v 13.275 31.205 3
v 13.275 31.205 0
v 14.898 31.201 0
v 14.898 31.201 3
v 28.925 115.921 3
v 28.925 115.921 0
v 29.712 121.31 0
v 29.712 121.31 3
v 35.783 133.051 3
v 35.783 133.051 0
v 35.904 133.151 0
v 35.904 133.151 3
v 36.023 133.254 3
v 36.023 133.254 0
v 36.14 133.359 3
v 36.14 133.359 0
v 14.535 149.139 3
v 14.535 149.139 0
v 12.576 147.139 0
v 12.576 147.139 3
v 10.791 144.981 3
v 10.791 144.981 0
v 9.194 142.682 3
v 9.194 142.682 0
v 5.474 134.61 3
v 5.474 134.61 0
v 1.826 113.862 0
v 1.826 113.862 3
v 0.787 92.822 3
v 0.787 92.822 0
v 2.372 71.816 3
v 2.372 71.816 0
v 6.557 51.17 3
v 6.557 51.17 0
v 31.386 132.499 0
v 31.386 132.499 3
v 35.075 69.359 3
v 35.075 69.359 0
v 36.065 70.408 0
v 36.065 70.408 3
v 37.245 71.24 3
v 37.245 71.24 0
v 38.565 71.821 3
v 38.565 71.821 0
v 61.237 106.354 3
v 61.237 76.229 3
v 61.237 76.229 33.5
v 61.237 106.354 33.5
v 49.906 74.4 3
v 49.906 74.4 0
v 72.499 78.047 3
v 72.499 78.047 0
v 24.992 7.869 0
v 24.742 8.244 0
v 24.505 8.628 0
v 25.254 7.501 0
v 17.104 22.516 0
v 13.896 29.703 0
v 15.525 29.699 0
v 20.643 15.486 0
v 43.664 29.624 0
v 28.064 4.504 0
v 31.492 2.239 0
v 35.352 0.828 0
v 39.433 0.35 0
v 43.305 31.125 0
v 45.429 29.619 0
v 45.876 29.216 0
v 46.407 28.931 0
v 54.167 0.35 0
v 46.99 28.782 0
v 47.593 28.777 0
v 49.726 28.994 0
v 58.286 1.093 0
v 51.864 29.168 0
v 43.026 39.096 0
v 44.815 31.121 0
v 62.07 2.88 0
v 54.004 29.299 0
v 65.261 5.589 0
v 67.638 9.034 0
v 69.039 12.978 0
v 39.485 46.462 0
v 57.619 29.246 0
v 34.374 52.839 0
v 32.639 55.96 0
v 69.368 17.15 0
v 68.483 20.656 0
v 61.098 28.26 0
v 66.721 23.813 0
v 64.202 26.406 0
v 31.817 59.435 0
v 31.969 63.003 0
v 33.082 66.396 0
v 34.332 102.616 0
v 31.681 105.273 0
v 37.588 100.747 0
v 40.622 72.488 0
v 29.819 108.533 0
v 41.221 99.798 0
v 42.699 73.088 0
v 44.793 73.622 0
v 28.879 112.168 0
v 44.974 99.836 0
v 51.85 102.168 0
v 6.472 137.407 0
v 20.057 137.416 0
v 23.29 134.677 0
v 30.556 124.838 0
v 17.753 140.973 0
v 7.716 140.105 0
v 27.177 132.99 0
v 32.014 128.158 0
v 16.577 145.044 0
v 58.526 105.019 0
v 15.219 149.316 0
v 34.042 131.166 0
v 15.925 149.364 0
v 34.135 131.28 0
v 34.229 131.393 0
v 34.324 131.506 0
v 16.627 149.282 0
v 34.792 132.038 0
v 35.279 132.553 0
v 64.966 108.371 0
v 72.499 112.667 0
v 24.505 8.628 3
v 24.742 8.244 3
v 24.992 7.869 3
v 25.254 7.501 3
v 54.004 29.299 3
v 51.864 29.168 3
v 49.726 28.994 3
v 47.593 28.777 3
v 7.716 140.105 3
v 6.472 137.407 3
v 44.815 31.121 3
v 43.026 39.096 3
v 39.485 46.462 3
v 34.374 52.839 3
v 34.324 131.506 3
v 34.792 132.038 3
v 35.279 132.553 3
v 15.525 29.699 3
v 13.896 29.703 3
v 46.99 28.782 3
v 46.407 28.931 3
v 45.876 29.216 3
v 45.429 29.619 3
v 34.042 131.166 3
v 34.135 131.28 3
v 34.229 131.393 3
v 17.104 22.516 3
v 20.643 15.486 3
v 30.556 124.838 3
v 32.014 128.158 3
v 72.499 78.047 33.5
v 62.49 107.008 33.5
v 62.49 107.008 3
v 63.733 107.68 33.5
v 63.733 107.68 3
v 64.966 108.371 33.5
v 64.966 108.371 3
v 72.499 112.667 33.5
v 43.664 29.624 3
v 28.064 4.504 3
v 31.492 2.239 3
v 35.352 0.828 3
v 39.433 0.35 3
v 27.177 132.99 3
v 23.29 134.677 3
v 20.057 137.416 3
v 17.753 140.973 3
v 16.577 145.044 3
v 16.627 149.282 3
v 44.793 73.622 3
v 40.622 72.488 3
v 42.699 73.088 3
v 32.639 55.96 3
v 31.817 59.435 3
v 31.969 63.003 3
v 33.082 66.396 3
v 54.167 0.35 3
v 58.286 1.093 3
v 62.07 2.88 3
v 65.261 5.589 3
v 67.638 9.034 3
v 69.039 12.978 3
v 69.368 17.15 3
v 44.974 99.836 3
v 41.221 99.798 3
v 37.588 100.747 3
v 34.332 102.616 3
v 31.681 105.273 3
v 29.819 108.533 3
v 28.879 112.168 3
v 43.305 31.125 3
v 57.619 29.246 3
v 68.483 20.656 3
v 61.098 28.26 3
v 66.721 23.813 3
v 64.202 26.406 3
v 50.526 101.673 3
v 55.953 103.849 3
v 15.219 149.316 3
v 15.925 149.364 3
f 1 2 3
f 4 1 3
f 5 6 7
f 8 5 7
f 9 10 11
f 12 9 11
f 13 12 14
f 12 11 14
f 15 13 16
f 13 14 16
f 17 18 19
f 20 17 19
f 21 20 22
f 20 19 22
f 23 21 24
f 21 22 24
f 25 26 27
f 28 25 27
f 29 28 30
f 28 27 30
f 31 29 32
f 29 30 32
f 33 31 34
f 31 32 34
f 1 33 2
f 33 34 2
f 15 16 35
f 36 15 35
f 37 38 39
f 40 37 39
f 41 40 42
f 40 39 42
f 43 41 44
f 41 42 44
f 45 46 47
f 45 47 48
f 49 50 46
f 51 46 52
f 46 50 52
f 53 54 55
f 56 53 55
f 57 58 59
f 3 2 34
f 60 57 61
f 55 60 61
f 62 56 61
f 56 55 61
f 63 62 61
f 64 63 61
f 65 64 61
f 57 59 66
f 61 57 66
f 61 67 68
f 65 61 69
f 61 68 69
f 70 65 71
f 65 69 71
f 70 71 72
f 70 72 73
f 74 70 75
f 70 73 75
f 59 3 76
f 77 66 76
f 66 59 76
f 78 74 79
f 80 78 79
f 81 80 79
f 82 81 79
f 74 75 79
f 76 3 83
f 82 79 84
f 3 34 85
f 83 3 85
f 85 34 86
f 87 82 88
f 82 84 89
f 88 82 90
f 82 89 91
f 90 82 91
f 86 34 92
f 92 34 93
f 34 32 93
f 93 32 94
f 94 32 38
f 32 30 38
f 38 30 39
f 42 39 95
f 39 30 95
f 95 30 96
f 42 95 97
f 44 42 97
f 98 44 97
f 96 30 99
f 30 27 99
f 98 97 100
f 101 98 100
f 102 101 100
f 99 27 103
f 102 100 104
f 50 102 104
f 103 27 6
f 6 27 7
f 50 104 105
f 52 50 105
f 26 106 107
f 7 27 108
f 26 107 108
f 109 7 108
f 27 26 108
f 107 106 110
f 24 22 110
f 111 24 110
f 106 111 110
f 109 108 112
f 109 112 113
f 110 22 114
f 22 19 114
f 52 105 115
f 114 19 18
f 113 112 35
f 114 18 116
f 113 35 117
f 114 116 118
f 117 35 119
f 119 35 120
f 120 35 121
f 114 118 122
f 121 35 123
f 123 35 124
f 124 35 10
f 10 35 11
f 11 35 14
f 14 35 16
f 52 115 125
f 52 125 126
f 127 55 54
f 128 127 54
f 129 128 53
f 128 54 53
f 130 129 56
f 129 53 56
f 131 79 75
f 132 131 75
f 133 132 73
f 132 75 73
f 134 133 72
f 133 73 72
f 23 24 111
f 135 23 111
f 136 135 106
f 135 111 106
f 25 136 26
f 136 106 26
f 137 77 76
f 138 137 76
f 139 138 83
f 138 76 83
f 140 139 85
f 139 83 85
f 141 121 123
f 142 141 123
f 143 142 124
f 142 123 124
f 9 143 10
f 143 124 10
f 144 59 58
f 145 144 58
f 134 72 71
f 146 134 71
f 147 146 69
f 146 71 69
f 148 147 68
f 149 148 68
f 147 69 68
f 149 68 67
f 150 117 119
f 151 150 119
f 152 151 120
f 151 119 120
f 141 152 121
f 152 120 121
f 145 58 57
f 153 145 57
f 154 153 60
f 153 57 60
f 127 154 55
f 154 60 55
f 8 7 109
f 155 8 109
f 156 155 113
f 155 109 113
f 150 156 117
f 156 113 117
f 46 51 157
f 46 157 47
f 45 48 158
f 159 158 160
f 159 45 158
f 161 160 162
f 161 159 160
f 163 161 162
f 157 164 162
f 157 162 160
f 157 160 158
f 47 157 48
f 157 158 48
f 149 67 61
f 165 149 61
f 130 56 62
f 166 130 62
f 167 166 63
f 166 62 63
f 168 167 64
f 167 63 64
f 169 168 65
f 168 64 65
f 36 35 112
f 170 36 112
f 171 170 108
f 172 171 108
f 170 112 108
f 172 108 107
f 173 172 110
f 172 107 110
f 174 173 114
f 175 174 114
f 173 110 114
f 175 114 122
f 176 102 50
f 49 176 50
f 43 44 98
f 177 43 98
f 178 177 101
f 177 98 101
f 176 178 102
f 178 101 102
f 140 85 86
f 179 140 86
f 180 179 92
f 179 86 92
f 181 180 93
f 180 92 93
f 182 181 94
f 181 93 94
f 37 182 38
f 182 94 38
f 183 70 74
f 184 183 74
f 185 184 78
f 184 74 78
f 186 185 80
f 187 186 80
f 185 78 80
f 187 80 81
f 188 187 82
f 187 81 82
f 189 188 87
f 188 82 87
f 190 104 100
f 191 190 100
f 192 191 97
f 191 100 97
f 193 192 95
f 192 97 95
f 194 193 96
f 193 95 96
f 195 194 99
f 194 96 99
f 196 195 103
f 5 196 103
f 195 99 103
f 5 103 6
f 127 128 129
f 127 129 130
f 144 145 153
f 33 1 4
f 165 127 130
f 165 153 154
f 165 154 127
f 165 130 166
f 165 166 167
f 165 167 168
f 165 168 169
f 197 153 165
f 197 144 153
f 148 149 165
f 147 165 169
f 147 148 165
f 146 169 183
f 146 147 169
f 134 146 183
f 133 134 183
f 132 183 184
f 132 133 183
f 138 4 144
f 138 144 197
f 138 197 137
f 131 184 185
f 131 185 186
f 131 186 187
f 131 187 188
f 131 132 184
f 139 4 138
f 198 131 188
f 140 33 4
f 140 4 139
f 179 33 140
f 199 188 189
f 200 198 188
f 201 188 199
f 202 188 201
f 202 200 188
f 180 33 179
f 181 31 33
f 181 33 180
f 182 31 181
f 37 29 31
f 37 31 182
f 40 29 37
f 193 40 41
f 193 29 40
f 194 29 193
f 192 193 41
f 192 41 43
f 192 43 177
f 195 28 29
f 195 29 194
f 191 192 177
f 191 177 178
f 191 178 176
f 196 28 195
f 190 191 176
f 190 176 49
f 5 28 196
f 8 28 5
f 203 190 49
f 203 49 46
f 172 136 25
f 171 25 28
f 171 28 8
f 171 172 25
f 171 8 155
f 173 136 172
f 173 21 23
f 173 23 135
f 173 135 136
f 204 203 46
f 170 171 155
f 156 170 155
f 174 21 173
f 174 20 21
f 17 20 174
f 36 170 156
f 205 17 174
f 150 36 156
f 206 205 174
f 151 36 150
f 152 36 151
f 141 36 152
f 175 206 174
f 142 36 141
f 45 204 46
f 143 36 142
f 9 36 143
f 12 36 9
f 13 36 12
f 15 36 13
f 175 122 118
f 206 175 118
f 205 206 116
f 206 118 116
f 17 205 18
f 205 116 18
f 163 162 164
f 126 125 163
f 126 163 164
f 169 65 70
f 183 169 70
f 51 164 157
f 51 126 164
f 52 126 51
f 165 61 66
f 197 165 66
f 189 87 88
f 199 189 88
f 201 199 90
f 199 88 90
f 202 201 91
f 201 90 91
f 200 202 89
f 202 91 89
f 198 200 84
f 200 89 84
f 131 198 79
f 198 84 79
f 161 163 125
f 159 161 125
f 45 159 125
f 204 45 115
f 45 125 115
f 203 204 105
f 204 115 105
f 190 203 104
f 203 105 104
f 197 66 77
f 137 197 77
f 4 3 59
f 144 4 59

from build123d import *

# Parameters (mm, degrees)
BOSS_EXTRUDE2_DEPTH = 3
BOSS_EXTRUDE3_DEPTH = 30.5


with BuildPart() as part:
    # Sketch1 → Boss-Extrude2 (new body)
    with BuildSketch(Plane.XY):
        with BuildLine():
            Line((13.275380686, 31.205054945), (14.898132017, 31.200709019))
            Line((14.898132017, 31.200709019), (15.525048851, 29.699024681))
            Line((15.525048851, 29.699024681), (13.895725818, 29.703388206))
            ThreePointArc((13.895725818, 29.703388206), (18.832488619, 18.980593631), (24.505317159, 8.628349101))
            ThreePointArc((24.505317159, 8.628349101), (24.86546573, 8.055516696), (25.253864185, 7.501449375))
            ThreePointArc((25.253864185, 7.501449375), (31.492395544, 2.238754737), (39.432559358, 0.349567888))
            Line((39.432559358, 0.349567888), (54.166964146, 0.349567888))
            ThreePointArc((54.166964146, 0.349567888), (65.260793251, 5.589158017), (69.367502095, 17.15035568))
            ThreePointArc((69.367502095, 17.15035568), (64.201860596, 26.406348327), (54.004278297, 29.298850229))
            ThreePointArc((54.004278297, 29.298850229), (50.794421974, 29.086613139), (47.592527294, 28.776624992))
            ThreePointArc((47.592527294, 28.776624992), (46.406851761, 28.931308018), (45.428630625, 29.618939254))
            Line((45.428630625, 29.618939254), (43.664188783, 29.623664644))
            Line((43.664188783, 29.623664644), (43.305228514, 31.124631363))
            Line((43.305228514, 31.124631363), (44.814654419, 31.120588936))
            ThreePointArc((44.814654419, 31.120588936), (41.465663123, 42.879415537), (34.373869876, 52.838944354))
            ThreePointArc((34.373869876, 52.838944354), (31.77008993, 61.224226607), (35.075221649, 69.358643168))
            ThreePointArc((35.075221649, 69.358643168), (36.634181143, 70.853545892), (38.565369315, 71.820810645))
            ThreePointArc((38.565369315, 71.820810645), (41.657810048, 72.796166819), (44.793456308, 73.622140114))
            Line((44.793456308, 73.622140114), (49.906358238, 74.39986774))
            Line((49.906358238, 74.39986774), (72.499029275, 78.04718712))
            Line((72.499029275, 78.04718712), (72.499029275, 112.666688298))
            Line((72.499029275, 112.666688298), (64.965959637, 108.371234093))
            ThreePointArc((64.965959637, 108.371234093), (55.215260948, 103.529752912), (44.974426149, 99.836330705))
            ThreePointArc((44.974426149, 99.836330705), (32.918019246, 103.856141001), (28.925028873, 115.921456997))
            Line((28.925028873, 115.921456997), (29.712339951, 121.309986069))
            ThreePointArc((29.712339951, 121.309986069), (31.21062393, 126.530705767), (34.041547196, 131.166074417))
            ThreePointArc((34.041547196, 131.166074417), (34.181825554, 131.336695356), (34.323954998, 131.505777418))
            ThreePointArc((34.323954998, 131.505777418), (35.033278252, 132.297306273), (35.783119531, 133.050562846))
            ThreePointArc((35.783119531, 133.050562846), (35.963964723, 133.201914626), (36.140056994, 133.358770791))
            Line((36.140056994, 133.358770791), (31.386106103, 132.498519796))
            ThreePointArc((31.386106103, 132.498519796), (20.056581392, 137.416407931), (16.627117574, 149.281589422))
            ThreePointArc((16.627117574, 149.281589422), (15.570836478, 149.356522247), (14.534507264, 149.138883925))
            ThreePointArc((14.534507264, 149.138883925), (11.661008479, 146.078583559), (9.194011926, 142.682061573))
            ThreePointArc((9.194011926, 142.682061573), (7.06412615, 138.77022346), (5.473593477, 134.609803211))
            ThreePointArc((5.473593477, 134.609803211), (1.252330233, 82.294620281), (13.275380686, 31.205054945))
        make_face()
    extrude(amount=BOSS_EXTRUDE2_DEPTH)

    # Sketch2 → Boss-Extrude3 (add)
    with BuildSketch(Plane.XY.offset(3)):
        with BuildLine():
            Line((61.236736711, 76.229023262), (61.236736711, 106.35376845))
            ThreePointArc((61.236736711, 106.35376845), (63.112611761, 107.341680879), (64.965959637, 108.371234093))
            Line((64.965959637, 108.371234093), (72.499029275, 112.666688298))
            Line((72.499029275, 112.666688298), (72.499029275, 78.04718712))
            Line((72.499029275, 78.04718712), (61.236736711, 76.229023262))
        make_face()
    extrude(amount=BOSS_EXTRUDE3_DEPTH)


solid = part.part
